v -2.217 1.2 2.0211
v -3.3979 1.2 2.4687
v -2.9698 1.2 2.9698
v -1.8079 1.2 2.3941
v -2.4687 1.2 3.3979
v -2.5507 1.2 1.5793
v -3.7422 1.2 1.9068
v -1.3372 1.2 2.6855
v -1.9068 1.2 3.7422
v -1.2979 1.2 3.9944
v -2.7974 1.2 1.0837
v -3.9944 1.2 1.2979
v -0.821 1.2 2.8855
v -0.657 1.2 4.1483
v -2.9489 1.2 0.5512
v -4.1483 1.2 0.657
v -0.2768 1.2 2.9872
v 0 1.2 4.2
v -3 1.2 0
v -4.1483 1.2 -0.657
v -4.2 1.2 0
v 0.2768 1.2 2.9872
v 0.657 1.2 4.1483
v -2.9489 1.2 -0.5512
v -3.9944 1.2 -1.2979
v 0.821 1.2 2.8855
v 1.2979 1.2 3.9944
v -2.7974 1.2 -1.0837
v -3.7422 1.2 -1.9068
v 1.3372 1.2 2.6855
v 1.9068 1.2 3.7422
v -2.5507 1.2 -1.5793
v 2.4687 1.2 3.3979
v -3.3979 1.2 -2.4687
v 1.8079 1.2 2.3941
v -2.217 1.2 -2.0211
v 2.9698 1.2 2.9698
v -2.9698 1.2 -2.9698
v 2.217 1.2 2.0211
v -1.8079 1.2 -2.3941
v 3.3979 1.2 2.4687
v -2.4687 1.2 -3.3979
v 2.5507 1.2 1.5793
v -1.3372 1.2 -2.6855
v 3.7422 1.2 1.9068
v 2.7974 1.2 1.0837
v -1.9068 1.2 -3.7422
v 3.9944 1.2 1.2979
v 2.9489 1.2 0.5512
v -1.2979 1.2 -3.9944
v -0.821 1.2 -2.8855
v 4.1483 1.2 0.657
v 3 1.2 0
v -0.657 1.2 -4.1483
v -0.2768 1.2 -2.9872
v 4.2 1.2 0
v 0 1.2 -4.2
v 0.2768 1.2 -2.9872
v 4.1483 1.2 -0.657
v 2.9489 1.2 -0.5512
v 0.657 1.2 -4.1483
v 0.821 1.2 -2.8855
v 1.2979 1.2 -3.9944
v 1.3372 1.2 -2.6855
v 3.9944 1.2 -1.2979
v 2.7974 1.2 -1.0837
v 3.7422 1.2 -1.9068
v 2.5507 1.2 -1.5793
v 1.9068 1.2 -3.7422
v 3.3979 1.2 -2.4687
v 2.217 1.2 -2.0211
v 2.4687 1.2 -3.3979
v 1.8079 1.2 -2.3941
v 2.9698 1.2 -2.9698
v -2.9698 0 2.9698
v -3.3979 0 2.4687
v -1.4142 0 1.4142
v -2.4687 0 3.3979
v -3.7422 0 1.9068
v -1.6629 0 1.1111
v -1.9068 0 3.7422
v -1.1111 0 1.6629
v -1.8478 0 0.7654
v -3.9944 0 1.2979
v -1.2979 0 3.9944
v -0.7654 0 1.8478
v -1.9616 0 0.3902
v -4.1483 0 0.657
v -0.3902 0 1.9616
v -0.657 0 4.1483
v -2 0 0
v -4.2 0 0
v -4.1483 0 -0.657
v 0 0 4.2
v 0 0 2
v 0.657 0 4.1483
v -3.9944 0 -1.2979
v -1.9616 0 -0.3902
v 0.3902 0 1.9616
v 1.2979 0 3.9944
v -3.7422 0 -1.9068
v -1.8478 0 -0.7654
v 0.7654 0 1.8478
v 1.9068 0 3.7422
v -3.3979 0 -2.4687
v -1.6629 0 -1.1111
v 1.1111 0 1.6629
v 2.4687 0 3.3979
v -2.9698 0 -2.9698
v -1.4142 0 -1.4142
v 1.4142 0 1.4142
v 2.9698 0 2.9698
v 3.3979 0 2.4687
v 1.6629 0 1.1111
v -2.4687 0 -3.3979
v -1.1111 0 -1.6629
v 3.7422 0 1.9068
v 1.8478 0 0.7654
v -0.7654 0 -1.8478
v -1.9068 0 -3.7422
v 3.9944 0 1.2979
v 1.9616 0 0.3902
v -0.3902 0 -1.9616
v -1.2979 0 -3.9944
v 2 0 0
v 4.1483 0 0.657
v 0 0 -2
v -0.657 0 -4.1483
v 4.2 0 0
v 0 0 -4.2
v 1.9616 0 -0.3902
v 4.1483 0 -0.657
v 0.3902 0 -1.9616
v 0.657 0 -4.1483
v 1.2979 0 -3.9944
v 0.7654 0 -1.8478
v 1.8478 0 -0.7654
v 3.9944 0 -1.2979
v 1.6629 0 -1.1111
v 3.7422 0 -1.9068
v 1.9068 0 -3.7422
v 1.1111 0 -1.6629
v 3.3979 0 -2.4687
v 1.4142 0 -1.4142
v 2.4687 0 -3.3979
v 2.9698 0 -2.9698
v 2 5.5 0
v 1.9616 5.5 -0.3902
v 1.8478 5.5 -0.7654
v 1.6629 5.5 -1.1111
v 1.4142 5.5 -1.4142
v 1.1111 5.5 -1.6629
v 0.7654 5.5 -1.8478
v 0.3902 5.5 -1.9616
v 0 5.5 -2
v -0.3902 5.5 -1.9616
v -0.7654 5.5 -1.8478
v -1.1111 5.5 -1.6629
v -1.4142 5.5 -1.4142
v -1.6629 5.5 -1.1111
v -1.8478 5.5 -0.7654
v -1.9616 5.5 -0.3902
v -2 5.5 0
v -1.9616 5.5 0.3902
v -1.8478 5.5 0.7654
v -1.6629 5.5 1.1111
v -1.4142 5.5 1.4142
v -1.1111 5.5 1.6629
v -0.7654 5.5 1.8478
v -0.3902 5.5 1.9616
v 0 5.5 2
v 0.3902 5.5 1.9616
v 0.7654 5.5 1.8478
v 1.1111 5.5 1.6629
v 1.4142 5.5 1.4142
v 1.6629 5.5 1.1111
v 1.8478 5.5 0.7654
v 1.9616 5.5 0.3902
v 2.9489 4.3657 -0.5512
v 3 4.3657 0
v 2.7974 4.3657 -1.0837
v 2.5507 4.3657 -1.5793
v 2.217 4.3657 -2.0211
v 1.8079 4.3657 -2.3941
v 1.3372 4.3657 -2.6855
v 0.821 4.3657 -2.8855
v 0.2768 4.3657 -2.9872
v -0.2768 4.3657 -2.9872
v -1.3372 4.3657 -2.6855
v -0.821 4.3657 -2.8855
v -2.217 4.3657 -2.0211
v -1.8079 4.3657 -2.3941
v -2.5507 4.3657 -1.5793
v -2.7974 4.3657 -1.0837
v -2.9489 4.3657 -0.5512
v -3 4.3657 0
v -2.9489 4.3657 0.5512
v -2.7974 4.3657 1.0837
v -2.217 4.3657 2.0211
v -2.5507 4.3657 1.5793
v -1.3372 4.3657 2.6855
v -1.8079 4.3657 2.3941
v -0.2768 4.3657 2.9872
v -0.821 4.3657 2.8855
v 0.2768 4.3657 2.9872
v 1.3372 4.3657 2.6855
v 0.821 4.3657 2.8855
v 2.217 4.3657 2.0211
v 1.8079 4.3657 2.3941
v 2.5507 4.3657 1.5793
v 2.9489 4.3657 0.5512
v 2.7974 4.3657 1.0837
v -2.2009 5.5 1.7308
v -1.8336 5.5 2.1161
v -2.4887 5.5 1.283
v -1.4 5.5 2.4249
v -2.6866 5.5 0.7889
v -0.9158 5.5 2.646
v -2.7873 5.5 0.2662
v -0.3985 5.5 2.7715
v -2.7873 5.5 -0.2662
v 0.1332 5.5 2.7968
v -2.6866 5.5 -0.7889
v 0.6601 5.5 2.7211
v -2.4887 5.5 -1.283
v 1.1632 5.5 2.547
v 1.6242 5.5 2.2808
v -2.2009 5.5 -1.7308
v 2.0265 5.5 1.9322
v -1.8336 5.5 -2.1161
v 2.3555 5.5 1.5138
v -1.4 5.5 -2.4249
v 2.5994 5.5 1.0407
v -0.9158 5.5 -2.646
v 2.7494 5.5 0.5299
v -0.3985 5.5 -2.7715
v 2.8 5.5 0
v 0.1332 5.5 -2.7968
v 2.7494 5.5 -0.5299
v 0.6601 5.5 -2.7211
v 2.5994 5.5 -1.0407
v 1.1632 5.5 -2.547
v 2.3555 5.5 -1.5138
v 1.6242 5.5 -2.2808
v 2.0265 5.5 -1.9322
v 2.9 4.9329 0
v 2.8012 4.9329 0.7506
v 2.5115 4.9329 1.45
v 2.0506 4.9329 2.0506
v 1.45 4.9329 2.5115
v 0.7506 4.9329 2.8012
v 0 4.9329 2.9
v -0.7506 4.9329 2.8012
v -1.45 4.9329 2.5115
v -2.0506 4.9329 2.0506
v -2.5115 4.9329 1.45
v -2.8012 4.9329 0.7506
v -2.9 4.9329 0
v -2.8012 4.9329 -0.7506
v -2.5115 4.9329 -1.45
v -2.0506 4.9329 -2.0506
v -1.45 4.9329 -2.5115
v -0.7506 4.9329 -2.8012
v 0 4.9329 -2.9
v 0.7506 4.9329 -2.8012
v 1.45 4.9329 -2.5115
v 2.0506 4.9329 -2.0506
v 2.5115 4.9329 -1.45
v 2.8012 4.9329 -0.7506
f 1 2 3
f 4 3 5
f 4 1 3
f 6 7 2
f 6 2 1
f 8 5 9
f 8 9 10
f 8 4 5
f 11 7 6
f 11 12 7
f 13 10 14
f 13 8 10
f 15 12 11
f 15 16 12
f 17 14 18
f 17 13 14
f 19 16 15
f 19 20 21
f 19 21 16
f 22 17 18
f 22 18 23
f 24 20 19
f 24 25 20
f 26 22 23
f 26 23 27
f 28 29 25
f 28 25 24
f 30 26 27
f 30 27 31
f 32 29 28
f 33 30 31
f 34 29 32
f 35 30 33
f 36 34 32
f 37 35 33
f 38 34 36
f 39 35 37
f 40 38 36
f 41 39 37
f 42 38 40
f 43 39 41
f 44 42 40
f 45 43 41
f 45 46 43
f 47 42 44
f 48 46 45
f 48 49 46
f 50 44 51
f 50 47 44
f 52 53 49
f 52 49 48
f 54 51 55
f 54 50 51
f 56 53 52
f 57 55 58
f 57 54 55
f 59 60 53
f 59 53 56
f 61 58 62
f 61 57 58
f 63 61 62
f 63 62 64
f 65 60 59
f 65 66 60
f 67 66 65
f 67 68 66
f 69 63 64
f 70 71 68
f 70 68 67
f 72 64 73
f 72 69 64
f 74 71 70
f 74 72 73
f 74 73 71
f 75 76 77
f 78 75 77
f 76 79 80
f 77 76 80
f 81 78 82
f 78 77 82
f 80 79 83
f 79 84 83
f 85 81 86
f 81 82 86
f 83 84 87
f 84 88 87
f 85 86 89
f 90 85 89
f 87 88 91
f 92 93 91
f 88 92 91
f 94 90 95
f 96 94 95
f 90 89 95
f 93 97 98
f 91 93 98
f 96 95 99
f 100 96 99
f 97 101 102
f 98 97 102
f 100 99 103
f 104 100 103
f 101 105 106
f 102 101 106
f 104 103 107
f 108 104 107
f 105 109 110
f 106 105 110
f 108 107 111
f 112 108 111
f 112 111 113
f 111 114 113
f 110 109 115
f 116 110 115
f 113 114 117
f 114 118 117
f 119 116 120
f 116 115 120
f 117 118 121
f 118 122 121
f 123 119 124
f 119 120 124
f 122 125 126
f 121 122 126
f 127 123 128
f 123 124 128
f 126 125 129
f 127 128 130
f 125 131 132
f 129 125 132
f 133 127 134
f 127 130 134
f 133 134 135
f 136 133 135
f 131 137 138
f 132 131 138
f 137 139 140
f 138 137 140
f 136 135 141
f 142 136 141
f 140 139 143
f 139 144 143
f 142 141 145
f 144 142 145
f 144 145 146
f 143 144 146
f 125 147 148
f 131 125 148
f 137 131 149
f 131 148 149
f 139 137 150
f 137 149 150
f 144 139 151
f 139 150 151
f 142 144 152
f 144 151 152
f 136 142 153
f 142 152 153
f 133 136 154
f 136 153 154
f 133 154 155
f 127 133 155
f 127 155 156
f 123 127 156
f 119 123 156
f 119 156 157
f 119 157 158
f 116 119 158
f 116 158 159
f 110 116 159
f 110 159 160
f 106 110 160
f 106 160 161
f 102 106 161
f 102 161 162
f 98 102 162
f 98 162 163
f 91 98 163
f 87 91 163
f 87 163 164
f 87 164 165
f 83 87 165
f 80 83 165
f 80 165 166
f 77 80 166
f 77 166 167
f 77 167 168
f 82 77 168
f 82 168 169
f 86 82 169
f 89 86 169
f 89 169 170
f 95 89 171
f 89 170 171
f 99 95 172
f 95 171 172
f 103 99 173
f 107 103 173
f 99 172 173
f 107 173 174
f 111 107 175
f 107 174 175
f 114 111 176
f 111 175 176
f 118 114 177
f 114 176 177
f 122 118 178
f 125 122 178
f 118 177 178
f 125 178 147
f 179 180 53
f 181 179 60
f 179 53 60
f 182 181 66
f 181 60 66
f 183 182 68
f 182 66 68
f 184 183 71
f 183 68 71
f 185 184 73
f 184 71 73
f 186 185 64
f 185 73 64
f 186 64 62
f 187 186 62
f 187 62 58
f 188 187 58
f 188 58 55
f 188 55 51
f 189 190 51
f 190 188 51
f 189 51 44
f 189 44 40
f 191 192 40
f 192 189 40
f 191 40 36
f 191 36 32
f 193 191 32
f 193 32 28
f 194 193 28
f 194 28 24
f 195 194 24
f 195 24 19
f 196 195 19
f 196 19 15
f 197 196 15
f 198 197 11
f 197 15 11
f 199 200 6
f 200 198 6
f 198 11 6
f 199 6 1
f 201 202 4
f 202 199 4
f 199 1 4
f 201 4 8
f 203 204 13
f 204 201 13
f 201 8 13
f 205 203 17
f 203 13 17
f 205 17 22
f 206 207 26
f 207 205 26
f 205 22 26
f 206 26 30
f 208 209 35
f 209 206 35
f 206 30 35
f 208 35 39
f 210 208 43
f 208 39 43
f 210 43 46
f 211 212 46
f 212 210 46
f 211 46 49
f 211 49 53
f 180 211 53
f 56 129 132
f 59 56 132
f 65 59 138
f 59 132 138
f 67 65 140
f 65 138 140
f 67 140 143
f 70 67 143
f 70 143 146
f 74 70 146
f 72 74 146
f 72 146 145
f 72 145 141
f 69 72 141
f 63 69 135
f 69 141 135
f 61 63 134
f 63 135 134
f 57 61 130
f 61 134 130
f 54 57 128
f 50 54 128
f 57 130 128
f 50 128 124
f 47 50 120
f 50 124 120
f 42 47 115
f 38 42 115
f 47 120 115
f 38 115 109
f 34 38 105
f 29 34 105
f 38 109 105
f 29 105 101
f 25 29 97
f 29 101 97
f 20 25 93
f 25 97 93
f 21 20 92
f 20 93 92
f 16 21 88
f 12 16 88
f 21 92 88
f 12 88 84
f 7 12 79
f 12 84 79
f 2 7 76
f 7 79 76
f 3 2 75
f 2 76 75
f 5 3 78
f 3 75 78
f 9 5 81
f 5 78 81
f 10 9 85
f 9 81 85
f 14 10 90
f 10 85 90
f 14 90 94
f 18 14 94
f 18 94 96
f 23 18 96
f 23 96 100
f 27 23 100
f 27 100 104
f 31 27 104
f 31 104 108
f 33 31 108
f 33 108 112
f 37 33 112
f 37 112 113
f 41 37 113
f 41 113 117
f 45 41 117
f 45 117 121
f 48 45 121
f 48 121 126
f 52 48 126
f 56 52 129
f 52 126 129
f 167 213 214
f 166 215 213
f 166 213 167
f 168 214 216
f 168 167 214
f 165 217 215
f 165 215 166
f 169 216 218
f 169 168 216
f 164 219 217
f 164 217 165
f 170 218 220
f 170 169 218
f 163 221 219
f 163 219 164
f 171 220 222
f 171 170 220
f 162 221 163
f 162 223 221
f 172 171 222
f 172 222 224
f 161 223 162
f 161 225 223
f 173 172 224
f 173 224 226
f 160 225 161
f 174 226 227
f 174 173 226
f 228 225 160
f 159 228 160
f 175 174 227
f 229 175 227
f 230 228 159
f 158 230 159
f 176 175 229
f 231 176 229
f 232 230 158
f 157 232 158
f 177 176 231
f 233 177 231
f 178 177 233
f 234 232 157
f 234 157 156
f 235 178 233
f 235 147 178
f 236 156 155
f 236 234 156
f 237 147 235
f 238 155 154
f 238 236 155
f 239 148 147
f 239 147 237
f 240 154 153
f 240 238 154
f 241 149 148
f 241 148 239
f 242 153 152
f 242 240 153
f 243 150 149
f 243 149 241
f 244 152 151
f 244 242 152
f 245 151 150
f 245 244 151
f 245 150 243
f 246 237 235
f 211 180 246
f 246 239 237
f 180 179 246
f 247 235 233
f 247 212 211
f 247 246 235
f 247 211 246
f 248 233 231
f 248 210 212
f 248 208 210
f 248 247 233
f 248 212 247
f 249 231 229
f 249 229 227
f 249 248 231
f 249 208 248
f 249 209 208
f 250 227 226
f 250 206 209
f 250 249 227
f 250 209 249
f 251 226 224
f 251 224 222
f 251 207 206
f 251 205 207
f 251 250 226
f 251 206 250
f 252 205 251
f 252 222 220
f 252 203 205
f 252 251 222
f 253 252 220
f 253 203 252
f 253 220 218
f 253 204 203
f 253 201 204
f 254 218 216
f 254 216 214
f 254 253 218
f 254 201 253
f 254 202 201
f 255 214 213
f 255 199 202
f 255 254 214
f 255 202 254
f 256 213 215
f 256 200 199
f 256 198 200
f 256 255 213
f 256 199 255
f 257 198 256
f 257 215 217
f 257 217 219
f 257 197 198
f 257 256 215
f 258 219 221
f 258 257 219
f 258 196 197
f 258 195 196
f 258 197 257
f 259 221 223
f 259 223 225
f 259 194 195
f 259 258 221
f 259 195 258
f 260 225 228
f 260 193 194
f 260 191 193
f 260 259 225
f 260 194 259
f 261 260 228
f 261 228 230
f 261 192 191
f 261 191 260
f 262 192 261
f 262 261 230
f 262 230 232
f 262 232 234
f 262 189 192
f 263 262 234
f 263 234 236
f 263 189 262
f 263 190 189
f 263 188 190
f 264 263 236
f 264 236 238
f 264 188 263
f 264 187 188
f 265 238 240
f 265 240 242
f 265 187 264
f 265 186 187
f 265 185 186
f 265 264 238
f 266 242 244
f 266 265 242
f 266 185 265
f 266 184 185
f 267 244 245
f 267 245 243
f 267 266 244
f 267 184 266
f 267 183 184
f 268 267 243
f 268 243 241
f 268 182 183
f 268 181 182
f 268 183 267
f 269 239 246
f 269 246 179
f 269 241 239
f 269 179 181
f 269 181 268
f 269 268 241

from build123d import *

# Parameters (mm, degrees)
SKETCH2_R           = 4.2
BOSS_EXTRUDE1_DEPTH = 1.2
SKETCH3_R           = 3
BOSS_EXTRUDE2_DEPTH = 4.3
SKETCH4_OUTSIDE_W   = 14.534
SKETCH4_OUTSIDE_H   = 14.534
SKETCH4_OUTSIDE_R   = 2.8
CUT_EXTRUDE1_DEPTH  = 4.3
CUT_EXTRUDE1_TAPER  = 10
SKETCH5_R           = 2
CUT_EXTRUDE2_DEPTH  = 6.5


with BuildPart() as part:
    # Sketch2 → Boss-Extrude1 (new body)
    with BuildSketch(Plane(origin=(0, 0, 0), x_dir=(1, 0, 0), z_dir=(0, 1, 0))):
        Circle(SKETCH2_R)
    extrude(amount=BOSS_EXTRUDE1_DEPTH)

    # Sketch3 → Boss-Extrude2 (add)
    with BuildSketch(Plane(origin=(0, 1.2, 0), x_dir=(1, 0, 0), z_dir=(0, 1, 0))):
        Circle(SKETCH3_R)
    extrude(amount=BOSS_EXTRUDE2_DEPTH)

    # Sketch4 outside → Cut-Extrude1 (cut)
    with BuildSketch(Plane(origin=(0, 5.5, 0), x_dir=(1, 0, 0), z_dir=(0, 1, 0))):
        Rectangle(SKETCH4_OUTSIDE_W, SKETCH4_OUTSIDE_H)
        Circle(SKETCH4_OUTSIDE_R, mode=Mode.SUBTRACT)
    extrude(amount=-CUT_EXTRUDE1_DEPTH, taper=CUT_EXTRUDE1_TAPER, mode=Mode.SUBTRACT)

    # Sketch5 → Cut-Extrude2 (cut, through all)
    with BuildSketch(Plane(origin=(0, 5.5, 0), x_dir=(1, 0, 0), z_dir=(0, 1, 0))):
        Circle(SKETCH5_R)
    extrude(amount=-CUT_EXTRUDE2_DEPTH, mode=Mode.SUBTRACT)


solid = part.part
